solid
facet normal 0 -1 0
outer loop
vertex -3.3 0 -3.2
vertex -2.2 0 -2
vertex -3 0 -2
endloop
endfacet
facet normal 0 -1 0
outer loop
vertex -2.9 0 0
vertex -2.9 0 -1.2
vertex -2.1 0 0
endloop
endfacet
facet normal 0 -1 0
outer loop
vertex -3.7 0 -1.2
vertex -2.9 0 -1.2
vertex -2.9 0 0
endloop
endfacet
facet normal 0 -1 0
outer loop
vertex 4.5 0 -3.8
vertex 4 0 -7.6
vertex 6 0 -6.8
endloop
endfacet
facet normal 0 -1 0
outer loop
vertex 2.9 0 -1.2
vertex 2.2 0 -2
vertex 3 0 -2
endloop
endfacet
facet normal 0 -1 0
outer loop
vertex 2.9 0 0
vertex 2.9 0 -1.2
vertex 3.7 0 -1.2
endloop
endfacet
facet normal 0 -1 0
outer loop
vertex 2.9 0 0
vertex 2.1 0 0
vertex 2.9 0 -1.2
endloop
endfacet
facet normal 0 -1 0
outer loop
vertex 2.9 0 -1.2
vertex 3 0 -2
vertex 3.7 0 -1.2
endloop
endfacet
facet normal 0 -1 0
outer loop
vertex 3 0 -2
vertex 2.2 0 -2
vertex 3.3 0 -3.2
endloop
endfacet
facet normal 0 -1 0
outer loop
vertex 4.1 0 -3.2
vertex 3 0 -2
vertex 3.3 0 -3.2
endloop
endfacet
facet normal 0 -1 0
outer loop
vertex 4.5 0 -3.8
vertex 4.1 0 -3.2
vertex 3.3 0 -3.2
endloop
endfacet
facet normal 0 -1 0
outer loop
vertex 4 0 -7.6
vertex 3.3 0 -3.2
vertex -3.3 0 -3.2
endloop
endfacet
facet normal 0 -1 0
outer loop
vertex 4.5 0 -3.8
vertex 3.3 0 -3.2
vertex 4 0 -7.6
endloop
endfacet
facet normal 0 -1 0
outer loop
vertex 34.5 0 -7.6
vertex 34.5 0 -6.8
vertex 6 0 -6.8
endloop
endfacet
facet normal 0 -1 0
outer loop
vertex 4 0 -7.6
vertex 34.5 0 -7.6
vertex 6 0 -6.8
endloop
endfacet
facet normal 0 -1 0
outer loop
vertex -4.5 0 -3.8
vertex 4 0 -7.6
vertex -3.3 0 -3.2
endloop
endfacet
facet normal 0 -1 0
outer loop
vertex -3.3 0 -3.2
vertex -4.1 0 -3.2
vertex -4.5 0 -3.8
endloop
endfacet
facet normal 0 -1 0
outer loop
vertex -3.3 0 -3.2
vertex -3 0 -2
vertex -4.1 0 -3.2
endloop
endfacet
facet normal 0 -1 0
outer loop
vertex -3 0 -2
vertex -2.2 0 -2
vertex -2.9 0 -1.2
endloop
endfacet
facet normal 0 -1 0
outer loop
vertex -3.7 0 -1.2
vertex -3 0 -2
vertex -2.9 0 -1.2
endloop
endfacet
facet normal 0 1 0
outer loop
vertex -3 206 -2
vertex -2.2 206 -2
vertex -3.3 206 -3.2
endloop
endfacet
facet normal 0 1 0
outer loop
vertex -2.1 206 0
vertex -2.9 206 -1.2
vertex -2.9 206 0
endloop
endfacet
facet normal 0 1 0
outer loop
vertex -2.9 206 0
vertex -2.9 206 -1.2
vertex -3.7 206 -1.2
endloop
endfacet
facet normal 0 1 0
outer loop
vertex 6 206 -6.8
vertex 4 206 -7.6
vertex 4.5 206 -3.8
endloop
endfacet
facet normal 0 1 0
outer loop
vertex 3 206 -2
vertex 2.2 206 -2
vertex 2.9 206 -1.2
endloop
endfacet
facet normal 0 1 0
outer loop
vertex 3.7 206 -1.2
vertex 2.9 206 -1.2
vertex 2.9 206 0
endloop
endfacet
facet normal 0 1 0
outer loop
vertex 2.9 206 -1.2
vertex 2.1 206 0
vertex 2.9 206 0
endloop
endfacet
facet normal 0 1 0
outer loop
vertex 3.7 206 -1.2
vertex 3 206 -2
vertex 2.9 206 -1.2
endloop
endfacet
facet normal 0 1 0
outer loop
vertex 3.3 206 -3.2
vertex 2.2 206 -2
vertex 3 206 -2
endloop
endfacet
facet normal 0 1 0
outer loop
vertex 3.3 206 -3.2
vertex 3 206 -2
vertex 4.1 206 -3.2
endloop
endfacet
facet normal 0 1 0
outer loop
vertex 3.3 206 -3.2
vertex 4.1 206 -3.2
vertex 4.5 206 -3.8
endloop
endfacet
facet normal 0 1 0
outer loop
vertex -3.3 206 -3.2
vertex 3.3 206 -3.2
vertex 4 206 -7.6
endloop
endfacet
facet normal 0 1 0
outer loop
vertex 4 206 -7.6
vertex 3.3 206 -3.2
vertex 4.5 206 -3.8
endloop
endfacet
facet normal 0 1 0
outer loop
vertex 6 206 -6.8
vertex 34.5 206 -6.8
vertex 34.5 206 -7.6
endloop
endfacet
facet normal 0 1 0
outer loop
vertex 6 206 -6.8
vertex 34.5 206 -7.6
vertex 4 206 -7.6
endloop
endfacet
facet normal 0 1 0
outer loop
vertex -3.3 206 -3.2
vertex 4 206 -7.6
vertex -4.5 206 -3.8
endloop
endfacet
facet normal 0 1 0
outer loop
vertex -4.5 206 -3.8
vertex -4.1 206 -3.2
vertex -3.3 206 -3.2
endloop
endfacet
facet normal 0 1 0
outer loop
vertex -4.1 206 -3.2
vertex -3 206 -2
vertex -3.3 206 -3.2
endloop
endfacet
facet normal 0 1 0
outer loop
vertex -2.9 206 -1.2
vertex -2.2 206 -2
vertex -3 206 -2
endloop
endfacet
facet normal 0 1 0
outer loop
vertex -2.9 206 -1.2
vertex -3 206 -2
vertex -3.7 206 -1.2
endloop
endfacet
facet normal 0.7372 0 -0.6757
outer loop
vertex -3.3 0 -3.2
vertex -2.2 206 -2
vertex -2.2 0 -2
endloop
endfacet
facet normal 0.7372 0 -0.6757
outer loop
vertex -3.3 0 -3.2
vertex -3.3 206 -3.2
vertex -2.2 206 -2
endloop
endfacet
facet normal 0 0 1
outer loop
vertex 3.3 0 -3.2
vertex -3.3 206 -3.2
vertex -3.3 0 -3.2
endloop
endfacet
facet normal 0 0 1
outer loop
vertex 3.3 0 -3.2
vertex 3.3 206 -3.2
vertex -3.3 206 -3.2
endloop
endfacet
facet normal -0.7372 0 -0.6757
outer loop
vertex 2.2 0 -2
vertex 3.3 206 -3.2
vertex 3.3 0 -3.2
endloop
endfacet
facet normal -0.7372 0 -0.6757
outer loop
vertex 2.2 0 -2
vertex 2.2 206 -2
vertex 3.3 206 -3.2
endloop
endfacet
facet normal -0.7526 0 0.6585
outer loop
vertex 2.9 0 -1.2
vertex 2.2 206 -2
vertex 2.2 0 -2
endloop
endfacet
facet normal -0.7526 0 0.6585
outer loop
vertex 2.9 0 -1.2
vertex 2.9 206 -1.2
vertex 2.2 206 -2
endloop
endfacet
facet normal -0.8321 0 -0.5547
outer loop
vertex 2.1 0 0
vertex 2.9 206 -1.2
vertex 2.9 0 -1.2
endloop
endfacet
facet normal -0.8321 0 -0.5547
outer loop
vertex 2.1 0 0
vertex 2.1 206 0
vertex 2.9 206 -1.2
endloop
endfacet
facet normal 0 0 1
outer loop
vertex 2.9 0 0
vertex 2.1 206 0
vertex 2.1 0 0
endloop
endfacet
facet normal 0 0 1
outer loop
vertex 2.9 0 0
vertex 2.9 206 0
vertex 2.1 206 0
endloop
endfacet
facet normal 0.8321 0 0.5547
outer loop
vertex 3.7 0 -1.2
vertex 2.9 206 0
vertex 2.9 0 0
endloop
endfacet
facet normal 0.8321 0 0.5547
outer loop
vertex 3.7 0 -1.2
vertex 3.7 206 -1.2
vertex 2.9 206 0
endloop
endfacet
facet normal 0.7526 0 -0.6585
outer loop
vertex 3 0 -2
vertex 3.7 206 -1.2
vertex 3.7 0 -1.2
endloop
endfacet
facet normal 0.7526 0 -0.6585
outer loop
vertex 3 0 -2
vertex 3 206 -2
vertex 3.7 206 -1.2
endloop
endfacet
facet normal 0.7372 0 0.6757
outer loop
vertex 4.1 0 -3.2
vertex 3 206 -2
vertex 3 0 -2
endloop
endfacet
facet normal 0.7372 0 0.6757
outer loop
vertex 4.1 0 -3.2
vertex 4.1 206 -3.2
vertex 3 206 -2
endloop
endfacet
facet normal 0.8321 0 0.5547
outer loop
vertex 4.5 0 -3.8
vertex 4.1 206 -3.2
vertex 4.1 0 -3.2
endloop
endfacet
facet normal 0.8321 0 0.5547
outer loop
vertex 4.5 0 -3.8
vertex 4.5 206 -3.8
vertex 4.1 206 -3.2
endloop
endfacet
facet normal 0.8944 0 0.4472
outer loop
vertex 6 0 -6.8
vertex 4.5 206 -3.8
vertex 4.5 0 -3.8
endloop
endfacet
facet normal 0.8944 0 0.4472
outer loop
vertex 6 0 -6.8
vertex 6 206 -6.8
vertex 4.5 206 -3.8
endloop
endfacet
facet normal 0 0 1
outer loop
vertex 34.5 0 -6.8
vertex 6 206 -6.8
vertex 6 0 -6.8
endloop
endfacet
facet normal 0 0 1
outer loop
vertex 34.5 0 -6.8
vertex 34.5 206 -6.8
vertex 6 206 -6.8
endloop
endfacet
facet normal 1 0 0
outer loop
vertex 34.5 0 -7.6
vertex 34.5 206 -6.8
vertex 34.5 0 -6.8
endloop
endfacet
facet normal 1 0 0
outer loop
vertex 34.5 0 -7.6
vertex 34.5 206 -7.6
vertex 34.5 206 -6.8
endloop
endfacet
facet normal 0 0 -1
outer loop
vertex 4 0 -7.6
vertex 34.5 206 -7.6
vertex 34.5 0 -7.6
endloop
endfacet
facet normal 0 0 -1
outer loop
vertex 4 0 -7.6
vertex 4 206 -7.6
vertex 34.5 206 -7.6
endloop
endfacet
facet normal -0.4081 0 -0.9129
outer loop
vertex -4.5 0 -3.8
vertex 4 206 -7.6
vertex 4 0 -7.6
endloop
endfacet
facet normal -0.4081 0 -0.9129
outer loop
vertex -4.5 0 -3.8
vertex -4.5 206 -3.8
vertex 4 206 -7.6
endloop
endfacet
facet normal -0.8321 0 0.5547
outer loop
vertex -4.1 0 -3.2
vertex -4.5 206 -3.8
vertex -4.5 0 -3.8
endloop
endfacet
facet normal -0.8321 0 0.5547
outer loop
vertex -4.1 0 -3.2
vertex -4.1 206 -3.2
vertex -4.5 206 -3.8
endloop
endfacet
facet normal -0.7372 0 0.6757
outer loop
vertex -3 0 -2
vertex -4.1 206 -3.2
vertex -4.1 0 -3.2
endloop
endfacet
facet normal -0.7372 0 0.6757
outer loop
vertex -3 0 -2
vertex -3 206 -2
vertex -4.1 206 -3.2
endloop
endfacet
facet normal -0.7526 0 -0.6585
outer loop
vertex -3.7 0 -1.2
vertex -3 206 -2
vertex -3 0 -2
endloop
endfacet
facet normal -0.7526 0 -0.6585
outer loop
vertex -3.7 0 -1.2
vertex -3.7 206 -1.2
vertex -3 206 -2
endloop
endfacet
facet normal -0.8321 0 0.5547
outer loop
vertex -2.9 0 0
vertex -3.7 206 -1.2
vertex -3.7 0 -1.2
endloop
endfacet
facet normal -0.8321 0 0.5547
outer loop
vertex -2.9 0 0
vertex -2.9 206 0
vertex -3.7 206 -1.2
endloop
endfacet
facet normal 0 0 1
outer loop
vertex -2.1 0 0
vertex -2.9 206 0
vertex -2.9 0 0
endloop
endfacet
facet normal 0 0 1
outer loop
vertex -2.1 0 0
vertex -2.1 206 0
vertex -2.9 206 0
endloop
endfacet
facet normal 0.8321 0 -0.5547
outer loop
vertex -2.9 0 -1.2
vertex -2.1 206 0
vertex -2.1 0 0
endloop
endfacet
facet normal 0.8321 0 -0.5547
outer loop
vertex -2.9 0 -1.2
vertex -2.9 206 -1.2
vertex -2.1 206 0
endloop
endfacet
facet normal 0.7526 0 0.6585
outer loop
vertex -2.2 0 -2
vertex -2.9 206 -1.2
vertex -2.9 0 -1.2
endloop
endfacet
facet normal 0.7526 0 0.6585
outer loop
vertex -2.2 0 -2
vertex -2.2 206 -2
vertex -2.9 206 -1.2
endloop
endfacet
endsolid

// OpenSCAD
length = 206; // [3:0.1:500]

// conver extension on one side
// leave it 0 (zero) if you don't need it
side_extension_width = 0; // [0:0.1:20]

/* HIDDEN */
side_add_w = side_extension_width;

$fn=1*60;

top2_w = 1*9.0;
top_w = 1*8.2; // 9.2 -v2> 9.6 -v3> 10
w1 = 1*8.2;
w2 = 1*6;
w3 = 1*7.4; // 8 -v2> 7.4
bottom_w = 1*5.8;

h1 = 1*4 - 0.8; // 3.8 -v4> 4.0
h2 = 1*2;
h3 = 1*1.2;
h_top_cover = 1*0.6;

wall_thick = 1*0.8; // 
tb_thick = 1*0; // top-bottom thickness 0.8 -v3> 0.4 -v4> 0

side_w1 = 4;
side_h1 = h1 + 3;
side_w2 = top2_w/2 + 30;
side_w3 = 6;
side_thick = 0.8;



// MAIN

rotate([-90,0,0])
linear_extrude(height = length) {
	difference() {
		polygon(points=[[-bottom_w/2, 0],
						[-w3/2, h3],
						[-w2/2, h2],
						[-w1/2, h1],
						[-top_w/2, h1],
						[-top2_w/2, h1 + h_top_cover],
						[side_w1, side_h1 + h_top_cover + side_thick],
						[side_w2, side_h1 + h_top_cover + side_thick],
						[side_w2, side_h1 + h_top_cover],
						[side_w3, side_h1 + h_top_cover],
						[top2_w/2 + side_add_w, h1 + h_top_cover],            
						[top_w/2 + side_add_w, h1],
						[w1/2, h1],
						[w2/2, h2],
						[w3/2, h3],
						[bottom_w/2, 0]]);

		polygon(points=[[-bottom_w/2 + wall_thick, tb_thick],
						[-w3/2 + wall_thick, h3],
						[-w2/2 + wall_thick, h2],
						[-w1/2 + wall_thick, h1],
						[w1/2 - wall_thick, h1],
						[w2/2 - wall_thick, h2],
						[w3/2 - wall_thick, h3],
						[bottom_w/2 - wall_thick, tb_thick]]);
	}			
		
}
